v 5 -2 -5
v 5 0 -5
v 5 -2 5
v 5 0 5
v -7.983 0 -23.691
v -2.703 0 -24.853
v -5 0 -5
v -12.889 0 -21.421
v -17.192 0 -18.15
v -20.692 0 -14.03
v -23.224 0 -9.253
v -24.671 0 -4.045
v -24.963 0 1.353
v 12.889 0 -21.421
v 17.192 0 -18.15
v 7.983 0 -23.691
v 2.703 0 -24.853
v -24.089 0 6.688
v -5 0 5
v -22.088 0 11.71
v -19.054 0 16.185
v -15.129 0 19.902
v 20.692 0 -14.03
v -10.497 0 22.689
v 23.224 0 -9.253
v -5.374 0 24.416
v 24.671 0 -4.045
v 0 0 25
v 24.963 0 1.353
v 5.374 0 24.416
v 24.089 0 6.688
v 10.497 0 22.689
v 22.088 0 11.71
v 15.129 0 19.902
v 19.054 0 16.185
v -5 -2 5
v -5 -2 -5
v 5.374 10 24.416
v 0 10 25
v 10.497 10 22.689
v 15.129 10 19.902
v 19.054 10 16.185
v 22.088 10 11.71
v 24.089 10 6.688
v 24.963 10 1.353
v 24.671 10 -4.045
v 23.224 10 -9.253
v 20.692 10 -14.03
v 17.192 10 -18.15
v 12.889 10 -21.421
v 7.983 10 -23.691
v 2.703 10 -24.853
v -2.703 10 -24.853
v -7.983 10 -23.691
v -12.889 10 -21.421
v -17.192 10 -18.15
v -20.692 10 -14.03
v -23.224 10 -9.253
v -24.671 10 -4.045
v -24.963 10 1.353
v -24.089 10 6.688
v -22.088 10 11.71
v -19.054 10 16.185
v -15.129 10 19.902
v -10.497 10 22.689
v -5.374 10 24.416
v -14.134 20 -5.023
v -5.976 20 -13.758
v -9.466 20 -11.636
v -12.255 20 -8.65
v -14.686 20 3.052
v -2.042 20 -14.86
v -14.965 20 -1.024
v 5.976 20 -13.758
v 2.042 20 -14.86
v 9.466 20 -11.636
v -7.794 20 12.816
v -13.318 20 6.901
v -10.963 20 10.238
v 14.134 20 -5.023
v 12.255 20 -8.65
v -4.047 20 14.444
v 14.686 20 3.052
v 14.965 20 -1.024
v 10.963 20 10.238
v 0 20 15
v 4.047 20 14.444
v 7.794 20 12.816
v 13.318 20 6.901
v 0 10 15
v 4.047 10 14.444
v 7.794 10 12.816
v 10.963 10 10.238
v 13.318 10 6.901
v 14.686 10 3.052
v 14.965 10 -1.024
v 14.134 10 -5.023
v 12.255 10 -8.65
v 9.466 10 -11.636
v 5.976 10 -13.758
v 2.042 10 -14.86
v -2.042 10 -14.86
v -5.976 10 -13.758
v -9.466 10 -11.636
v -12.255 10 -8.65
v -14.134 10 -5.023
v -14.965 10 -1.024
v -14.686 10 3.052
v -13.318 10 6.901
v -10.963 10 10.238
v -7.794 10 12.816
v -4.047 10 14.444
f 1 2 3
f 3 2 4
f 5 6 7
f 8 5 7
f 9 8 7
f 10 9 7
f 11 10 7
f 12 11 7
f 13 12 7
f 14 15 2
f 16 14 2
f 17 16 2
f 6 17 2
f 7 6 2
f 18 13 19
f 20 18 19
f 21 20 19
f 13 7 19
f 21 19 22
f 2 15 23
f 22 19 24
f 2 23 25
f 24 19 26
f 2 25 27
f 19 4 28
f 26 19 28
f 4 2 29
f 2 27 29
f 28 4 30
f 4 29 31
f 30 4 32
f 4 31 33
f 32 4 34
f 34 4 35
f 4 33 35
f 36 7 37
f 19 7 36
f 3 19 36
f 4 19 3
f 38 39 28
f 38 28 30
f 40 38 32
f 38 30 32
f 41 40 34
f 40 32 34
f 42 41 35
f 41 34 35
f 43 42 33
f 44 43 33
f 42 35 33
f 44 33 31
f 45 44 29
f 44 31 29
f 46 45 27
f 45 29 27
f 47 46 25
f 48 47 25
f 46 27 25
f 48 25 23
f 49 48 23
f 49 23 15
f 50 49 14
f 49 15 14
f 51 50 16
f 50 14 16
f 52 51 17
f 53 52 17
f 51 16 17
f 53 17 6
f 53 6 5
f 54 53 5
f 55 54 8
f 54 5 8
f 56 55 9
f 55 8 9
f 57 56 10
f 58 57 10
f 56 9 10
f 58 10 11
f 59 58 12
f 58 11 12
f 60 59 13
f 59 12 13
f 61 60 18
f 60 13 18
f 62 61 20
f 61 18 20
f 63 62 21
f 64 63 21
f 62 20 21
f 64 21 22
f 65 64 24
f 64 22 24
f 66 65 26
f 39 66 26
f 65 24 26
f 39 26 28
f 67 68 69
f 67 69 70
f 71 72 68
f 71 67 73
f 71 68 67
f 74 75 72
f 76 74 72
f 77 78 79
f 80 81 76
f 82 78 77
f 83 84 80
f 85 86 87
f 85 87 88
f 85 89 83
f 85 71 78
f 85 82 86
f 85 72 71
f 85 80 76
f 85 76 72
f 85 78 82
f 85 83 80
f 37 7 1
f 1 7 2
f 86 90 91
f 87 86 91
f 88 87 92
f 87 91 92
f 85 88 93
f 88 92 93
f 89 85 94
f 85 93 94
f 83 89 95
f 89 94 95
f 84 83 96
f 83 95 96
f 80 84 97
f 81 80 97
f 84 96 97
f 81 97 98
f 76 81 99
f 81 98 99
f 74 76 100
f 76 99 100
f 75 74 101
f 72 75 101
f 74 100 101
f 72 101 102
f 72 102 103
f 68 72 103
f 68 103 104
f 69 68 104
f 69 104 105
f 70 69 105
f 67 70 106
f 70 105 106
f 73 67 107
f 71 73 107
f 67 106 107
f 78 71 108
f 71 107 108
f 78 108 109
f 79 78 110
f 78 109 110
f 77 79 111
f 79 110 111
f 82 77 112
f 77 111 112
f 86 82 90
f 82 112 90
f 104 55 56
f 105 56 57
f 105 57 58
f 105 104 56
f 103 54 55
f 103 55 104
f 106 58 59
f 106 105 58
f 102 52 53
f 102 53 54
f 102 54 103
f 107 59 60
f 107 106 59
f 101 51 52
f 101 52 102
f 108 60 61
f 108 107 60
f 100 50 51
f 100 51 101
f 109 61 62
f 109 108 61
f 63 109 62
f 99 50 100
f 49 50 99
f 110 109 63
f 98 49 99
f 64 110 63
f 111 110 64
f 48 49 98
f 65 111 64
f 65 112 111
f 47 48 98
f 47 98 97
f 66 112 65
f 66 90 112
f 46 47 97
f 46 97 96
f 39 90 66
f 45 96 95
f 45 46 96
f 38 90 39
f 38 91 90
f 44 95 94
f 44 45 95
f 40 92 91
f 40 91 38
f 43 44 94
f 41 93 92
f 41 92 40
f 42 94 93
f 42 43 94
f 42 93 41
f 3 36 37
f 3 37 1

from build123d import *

# Parameters (mm, degrees)
SKETCH1_R           = 25
BOSS_EXTRUDE1_DEPTH = 10
SKETCH2_R           = 15
BOSS_EXTRUDE2_DEPTH = 10
SKETCH3_W           = 10
SKETCH3_H           = 10
BOSS_EXTRUDE3_DEPTH = 2


with BuildPart() as part:
    # Sketch1 → Boss-Extrude1 (new body)
    with BuildSketch(Plane(origin=(0, 0, 0), x_dir=(1, 0, 0), z_dir=(0, 1, 0))):
        with Locations(Location((0, 0, 0), (0, 0, 270))):
            Circle(SKETCH1_R)
    extrude(amount=BOSS_EXTRUDE1_DEPTH)

    # Sketch2 → Boss-Extrude2 (add)
    with BuildSketch(Plane(origin=(0, 10, 0), x_dir=(1, 0, 0), z_dir=(0, 1, 0))):
        with Locations(Location((0, 0, 0), (0, 0, 270))):
            Circle(SKETCH2_R)
    extrude(amount=BOSS_EXTRUDE2_DEPTH)

    # Sketch3 → Boss-Extrude3 (add)
    with BuildSketch(Plane.XZ):
        Rectangle(SKETCH3_W, SKETCH3_H)
    extrude(amount=BOSS_EXTRUDE3_DEPTH)


solid = part.part
